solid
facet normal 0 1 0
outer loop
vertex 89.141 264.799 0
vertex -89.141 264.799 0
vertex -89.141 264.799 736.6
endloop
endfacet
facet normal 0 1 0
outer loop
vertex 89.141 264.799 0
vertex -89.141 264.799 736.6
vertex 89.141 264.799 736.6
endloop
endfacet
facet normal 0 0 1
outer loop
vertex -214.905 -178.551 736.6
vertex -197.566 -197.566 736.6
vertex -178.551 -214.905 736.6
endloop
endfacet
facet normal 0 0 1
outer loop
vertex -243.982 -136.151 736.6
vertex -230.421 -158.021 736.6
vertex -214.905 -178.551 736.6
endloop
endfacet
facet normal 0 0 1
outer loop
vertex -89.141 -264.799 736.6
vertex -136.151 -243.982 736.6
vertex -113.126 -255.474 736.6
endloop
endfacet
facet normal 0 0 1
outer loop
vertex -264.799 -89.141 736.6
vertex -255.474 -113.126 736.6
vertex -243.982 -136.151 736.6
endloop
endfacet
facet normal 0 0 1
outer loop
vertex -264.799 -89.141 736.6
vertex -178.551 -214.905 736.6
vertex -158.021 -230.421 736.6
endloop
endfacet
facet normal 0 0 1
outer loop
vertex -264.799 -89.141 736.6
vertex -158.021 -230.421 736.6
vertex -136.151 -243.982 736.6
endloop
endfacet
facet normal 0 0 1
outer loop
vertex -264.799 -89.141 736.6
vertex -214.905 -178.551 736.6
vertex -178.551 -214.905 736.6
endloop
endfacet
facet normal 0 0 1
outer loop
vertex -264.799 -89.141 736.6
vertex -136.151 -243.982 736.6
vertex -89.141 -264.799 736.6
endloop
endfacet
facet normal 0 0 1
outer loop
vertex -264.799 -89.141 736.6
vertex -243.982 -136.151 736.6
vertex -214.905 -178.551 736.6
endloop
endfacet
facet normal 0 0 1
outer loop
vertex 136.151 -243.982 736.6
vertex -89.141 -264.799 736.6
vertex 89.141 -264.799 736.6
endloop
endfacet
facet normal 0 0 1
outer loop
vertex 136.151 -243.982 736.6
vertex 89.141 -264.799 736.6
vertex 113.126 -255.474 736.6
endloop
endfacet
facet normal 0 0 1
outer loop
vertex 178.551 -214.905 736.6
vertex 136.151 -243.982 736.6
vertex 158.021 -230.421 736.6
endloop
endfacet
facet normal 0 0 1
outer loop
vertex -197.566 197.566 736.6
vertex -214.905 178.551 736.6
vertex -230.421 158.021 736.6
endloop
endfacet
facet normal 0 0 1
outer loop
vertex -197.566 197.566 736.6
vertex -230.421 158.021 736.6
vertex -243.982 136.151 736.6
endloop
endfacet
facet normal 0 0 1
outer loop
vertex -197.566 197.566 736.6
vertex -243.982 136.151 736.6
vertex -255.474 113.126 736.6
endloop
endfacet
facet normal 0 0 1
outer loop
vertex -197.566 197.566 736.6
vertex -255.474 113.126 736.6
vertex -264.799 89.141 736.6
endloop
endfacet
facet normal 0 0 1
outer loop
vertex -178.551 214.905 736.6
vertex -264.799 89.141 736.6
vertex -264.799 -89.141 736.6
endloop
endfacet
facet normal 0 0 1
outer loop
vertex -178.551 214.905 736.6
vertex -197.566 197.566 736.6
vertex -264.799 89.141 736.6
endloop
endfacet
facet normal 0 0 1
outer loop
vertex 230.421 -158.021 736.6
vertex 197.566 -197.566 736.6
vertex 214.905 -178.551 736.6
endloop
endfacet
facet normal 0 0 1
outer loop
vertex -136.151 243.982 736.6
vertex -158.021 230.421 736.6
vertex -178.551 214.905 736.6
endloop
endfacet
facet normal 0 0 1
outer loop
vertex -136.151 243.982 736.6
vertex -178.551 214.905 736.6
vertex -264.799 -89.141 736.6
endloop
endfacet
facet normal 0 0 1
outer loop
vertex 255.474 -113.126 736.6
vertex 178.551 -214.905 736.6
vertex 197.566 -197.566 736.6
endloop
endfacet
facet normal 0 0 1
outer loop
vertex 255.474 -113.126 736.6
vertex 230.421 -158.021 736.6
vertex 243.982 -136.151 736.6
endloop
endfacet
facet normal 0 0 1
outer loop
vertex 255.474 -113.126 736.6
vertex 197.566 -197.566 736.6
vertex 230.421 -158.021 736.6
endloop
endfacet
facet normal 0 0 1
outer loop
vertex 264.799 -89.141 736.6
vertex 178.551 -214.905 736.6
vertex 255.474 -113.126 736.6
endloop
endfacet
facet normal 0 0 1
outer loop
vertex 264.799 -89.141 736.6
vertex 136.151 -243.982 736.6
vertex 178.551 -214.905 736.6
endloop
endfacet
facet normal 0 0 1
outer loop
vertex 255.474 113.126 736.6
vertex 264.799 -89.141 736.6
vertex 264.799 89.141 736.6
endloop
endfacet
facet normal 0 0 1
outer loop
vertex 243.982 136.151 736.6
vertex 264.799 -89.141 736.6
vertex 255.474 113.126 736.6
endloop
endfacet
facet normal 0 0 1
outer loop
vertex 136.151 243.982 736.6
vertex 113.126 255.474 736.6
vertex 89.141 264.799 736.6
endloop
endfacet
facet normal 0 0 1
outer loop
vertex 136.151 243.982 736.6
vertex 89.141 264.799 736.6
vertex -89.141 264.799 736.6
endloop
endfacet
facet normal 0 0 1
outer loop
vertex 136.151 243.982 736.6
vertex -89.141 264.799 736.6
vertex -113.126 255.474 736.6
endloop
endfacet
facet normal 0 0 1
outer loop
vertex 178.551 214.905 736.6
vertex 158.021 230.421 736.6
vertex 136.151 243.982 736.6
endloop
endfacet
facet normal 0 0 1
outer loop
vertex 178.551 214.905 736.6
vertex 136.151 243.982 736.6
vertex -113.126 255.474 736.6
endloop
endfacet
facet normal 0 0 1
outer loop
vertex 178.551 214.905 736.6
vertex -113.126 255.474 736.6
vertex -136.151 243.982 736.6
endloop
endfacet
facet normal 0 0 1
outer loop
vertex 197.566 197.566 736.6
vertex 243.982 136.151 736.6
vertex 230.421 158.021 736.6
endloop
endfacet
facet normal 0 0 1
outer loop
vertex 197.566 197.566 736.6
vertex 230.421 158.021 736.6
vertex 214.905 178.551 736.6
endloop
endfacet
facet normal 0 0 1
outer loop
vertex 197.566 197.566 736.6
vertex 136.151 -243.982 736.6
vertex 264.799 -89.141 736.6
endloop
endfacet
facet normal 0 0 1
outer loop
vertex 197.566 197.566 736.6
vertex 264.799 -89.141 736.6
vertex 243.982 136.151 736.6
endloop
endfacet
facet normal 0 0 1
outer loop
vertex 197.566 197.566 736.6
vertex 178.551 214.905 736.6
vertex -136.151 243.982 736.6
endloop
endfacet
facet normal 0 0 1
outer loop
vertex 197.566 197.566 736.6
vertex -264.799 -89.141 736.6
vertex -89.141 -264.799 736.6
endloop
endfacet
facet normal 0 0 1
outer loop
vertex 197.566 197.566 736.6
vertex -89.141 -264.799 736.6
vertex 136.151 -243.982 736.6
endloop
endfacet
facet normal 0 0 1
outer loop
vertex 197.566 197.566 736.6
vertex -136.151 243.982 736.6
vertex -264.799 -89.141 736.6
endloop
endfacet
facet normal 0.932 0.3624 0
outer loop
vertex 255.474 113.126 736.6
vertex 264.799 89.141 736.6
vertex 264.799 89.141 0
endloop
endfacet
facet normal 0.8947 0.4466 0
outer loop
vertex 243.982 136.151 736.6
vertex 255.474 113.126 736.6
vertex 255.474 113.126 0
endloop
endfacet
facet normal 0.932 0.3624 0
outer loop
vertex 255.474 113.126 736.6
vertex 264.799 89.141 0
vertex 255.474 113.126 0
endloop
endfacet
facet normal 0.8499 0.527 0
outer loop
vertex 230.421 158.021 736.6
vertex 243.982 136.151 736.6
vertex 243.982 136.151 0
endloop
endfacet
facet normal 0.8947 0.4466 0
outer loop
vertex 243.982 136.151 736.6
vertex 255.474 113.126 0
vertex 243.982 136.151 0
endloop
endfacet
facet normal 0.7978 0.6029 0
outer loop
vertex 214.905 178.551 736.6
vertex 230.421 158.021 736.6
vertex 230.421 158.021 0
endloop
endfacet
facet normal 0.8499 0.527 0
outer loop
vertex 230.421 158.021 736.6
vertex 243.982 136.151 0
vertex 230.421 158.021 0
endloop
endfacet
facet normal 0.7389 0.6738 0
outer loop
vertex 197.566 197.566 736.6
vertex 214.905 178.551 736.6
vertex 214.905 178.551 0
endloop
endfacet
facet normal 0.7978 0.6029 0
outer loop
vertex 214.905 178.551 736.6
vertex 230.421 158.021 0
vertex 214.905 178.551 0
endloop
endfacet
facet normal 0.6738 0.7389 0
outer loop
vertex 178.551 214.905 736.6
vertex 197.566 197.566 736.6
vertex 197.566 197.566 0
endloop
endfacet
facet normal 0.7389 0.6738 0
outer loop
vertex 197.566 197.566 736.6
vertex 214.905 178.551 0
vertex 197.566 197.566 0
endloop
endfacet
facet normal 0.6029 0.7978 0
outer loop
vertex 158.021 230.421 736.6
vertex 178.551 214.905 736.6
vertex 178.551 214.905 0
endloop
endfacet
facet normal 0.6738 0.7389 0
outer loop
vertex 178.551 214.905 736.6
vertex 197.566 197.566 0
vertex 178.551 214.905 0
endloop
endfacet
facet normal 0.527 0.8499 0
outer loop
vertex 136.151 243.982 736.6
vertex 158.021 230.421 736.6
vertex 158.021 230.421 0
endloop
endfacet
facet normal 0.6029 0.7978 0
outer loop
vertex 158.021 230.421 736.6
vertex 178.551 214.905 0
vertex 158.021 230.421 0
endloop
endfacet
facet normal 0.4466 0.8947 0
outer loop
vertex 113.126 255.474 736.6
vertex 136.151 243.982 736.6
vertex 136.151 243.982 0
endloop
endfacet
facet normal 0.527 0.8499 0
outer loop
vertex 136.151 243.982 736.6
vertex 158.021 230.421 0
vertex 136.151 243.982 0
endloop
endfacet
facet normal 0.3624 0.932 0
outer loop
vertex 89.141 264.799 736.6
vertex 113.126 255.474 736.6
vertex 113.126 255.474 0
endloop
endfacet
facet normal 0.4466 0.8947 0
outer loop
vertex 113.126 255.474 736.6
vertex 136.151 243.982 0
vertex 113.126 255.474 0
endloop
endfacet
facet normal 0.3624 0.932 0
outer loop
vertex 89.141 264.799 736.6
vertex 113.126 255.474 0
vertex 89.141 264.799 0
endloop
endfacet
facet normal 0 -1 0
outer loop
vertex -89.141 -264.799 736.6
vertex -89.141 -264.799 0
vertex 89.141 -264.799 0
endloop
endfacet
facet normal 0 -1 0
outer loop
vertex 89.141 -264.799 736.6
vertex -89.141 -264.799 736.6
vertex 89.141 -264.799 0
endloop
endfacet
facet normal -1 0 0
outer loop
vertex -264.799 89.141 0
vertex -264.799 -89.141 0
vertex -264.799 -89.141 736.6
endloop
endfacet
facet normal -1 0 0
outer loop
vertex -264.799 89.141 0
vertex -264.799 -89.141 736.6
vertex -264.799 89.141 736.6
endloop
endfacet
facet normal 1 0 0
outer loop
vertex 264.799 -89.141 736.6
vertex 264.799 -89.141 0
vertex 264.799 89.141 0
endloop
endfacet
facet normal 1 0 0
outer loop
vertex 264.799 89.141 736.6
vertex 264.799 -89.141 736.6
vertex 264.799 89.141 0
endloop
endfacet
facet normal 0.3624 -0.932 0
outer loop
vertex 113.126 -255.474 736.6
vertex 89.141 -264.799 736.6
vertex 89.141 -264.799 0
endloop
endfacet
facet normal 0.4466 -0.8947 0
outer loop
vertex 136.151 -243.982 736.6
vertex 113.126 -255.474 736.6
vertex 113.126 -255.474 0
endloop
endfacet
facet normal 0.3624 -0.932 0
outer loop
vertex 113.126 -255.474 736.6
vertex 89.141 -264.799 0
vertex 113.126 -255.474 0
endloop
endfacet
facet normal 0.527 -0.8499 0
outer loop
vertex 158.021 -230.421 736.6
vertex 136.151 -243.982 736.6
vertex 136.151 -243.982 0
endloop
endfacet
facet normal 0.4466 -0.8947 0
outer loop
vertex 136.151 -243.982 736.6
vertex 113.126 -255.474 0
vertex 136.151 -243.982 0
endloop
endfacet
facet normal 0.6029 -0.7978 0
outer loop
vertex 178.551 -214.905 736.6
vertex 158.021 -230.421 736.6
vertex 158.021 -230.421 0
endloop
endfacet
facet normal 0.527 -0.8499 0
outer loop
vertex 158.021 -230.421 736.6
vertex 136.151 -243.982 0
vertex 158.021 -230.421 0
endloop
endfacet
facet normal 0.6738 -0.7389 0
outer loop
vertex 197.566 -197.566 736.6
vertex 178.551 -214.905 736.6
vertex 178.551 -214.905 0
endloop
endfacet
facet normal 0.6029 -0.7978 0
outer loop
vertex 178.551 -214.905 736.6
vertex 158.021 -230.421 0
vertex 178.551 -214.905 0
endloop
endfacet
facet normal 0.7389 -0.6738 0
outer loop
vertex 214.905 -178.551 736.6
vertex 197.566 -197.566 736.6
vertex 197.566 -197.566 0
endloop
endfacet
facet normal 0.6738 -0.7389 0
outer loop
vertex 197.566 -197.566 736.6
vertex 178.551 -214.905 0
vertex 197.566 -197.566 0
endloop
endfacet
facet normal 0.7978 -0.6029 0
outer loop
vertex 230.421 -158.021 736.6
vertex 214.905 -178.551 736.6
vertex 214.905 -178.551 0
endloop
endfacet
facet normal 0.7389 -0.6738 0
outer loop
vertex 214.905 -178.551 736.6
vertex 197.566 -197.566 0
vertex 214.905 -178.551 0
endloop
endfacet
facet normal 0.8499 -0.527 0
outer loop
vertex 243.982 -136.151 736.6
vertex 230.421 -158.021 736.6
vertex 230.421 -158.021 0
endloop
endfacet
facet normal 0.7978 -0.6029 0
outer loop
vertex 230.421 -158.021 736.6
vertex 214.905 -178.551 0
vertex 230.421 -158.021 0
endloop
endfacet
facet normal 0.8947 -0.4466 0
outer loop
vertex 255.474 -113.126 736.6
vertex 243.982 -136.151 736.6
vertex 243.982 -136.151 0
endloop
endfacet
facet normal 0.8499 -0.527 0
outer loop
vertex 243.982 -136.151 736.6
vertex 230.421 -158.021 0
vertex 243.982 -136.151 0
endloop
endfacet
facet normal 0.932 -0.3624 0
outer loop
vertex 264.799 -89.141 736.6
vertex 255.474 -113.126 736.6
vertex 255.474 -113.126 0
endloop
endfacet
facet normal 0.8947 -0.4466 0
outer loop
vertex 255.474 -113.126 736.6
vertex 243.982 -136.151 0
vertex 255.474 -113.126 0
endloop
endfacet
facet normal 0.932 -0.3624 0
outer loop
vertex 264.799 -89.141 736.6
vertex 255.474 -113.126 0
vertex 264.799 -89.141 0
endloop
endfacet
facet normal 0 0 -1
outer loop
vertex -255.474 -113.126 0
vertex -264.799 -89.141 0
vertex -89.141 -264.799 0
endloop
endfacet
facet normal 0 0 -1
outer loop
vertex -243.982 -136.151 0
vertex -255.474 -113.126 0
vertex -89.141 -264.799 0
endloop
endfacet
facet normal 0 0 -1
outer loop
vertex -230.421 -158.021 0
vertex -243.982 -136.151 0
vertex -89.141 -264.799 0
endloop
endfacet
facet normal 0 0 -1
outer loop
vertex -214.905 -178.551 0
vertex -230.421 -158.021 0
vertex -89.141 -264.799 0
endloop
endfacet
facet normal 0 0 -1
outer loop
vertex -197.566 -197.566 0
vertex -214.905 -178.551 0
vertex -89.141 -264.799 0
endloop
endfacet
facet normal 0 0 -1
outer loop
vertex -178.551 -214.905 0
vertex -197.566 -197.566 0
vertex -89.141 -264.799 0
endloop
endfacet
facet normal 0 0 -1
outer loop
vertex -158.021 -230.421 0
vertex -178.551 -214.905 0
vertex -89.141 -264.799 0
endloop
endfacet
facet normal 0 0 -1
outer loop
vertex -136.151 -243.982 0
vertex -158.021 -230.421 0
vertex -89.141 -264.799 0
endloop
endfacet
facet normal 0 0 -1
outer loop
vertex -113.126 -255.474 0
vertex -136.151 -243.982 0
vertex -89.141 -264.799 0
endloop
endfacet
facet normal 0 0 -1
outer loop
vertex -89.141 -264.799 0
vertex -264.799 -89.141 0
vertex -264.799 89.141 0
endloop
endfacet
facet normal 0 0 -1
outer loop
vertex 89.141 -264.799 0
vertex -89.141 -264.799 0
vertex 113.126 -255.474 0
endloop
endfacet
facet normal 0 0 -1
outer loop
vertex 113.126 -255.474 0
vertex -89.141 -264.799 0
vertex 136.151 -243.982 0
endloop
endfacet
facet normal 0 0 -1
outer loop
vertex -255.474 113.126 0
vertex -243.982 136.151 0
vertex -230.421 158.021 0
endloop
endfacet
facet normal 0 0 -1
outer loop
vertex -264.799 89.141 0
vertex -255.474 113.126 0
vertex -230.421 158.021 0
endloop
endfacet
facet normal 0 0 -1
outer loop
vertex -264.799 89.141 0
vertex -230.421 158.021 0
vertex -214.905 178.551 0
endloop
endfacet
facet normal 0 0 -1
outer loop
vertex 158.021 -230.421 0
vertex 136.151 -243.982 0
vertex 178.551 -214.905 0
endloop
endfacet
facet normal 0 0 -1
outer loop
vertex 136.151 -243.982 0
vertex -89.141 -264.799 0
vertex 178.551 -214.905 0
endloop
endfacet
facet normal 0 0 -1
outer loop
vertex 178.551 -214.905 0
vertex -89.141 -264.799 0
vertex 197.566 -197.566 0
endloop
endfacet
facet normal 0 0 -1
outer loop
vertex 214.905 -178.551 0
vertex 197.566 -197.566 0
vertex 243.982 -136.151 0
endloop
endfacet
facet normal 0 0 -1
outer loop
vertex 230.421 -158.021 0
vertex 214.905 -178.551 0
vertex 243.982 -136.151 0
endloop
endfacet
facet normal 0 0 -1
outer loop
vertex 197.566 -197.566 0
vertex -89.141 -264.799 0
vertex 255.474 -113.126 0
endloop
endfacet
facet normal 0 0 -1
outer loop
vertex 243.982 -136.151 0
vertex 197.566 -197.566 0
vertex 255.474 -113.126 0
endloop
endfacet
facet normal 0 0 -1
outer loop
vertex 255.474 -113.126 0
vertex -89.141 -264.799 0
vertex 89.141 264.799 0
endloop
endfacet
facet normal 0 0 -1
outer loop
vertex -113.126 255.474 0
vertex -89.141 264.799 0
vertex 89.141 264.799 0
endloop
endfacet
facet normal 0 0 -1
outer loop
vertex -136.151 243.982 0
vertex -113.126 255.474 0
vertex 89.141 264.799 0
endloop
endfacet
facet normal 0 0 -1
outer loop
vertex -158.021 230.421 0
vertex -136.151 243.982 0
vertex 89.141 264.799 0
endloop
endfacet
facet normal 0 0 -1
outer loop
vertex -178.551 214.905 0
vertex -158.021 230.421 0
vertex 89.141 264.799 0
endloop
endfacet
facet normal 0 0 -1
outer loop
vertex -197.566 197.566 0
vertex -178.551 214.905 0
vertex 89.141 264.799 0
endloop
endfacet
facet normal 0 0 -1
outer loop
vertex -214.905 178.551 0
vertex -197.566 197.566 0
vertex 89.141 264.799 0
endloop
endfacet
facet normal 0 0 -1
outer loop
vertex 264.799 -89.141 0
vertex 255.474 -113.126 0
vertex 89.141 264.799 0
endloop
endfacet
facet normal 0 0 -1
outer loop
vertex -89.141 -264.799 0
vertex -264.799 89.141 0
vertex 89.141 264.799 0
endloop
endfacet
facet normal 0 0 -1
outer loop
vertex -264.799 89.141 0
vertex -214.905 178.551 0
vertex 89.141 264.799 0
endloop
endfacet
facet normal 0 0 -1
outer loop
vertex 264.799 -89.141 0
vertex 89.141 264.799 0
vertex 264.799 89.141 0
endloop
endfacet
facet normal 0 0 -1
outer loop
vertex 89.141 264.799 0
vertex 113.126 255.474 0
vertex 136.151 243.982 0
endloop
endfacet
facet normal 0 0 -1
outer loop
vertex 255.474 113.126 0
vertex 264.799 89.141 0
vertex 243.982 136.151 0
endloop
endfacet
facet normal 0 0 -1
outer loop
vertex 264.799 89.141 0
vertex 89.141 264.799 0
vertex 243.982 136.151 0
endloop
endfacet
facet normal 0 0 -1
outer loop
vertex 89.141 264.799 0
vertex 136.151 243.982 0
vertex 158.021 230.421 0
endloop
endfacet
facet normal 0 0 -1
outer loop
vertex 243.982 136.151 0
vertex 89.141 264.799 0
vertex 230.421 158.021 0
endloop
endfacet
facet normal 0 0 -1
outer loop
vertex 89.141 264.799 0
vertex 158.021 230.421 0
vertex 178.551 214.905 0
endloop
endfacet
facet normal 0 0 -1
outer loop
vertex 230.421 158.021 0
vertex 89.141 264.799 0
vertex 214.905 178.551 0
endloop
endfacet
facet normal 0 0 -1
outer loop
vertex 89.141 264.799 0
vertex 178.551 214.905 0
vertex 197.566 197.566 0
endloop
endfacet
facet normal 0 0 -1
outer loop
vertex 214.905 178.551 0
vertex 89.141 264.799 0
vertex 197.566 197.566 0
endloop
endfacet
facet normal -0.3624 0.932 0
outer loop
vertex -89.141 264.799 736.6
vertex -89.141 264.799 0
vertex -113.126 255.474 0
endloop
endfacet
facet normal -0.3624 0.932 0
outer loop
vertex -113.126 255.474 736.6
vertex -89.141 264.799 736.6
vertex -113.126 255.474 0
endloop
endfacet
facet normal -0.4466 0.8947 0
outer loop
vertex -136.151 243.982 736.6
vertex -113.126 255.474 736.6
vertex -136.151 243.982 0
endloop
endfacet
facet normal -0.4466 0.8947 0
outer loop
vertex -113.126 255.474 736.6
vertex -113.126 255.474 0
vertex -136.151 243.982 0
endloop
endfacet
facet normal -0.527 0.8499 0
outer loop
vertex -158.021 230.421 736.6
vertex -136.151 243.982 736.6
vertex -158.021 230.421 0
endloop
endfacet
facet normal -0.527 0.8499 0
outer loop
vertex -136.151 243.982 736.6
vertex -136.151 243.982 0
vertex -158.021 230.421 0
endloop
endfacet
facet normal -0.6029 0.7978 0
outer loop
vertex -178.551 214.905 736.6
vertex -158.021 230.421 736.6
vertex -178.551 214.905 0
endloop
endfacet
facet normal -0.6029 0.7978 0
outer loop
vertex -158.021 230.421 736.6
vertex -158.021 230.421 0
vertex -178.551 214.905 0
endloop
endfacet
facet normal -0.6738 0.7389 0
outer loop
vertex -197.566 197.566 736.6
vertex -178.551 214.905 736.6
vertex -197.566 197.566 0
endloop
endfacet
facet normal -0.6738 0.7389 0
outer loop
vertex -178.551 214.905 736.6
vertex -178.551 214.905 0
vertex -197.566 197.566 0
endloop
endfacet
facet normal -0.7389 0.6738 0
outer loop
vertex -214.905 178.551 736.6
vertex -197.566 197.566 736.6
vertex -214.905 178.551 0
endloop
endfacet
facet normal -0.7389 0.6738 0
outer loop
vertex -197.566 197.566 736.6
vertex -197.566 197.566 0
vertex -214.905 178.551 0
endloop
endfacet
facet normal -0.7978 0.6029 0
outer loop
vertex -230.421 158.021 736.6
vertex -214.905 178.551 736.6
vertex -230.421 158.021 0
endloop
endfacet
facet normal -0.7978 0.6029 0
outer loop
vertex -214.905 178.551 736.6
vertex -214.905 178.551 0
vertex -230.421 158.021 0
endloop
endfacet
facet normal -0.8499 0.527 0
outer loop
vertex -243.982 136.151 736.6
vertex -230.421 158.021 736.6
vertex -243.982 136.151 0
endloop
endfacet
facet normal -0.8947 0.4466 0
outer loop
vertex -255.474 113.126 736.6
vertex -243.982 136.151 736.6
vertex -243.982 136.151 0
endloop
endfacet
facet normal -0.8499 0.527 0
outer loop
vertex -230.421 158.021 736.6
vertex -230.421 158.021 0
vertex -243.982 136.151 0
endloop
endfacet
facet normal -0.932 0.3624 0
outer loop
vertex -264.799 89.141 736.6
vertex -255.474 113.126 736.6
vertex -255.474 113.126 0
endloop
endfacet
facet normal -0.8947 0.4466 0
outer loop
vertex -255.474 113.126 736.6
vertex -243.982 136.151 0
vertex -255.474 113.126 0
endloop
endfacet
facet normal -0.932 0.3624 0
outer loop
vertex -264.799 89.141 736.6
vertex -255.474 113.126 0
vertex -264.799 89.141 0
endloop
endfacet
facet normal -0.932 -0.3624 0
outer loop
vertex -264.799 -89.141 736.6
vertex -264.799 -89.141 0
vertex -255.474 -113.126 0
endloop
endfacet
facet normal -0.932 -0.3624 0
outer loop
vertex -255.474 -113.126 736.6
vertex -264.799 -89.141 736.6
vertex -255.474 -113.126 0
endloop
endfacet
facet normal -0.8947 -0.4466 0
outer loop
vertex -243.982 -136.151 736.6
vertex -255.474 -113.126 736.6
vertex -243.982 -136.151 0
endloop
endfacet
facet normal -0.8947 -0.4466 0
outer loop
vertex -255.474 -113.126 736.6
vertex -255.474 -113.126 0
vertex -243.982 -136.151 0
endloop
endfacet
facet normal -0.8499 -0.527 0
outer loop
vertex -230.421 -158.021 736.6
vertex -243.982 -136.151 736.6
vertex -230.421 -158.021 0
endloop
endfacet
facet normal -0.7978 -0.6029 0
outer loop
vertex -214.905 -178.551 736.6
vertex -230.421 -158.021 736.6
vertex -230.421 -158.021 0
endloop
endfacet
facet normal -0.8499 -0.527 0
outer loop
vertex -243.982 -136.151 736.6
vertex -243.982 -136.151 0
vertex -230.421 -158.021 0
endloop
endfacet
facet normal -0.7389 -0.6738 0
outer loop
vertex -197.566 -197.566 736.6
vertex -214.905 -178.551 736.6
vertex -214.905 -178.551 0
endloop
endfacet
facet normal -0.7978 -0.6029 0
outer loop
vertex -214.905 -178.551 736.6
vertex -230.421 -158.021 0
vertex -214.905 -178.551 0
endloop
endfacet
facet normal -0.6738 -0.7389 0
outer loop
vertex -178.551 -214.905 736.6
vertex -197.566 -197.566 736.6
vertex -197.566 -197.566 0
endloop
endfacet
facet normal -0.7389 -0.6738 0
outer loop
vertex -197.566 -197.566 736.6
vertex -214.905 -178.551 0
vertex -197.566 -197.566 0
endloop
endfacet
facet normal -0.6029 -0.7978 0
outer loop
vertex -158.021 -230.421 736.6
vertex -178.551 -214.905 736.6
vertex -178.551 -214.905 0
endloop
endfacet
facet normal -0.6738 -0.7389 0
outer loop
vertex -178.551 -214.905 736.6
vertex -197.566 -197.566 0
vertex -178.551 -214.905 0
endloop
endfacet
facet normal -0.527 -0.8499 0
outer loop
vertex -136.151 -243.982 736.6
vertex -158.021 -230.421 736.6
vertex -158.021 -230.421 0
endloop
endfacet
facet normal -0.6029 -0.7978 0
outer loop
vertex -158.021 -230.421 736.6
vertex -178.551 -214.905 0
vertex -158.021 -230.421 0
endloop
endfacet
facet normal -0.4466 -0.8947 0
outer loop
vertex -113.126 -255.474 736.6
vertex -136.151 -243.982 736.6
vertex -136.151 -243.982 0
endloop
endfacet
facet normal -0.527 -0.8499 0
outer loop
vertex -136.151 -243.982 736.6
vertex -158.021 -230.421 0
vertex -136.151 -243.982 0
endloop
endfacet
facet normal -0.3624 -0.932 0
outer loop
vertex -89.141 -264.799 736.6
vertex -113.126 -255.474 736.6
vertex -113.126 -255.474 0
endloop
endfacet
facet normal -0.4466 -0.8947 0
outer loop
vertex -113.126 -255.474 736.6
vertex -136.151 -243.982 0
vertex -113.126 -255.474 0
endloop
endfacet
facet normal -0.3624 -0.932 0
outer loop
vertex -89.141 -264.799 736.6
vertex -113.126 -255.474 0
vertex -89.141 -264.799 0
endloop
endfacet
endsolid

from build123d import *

# Parameters (mm, degrees)
F0_R     = 279.4
F1_DEPTH = 736.6
F2_W     = 195.749157
F2_H     = 25.4
F2_W_2   = 25.4
F2_H_2   = 195.749157
F3_DEPTH = 1010.92


with BuildPart() as f1:
    # F0 (on Top) → F1 (new body)
    with BuildSketch(Plane.XY):
        Circle(F0_R)
    extrude(amount=F1_DEPTH)

    # F2 (on Top) → F3 (cut)
    with BuildSketch(Plane.XY):
        with Locations((0.382937, 277.498556)):
            Rectangle(F2_W, F2_H)
        with Locations((-277.498556, 0.382937)):
            Rectangle(F2_W_2, F2_H_2)
        with Locations((-0.382937, -277.498556)):
            Rectangle(F2_W, F2_H)
        with Locations((277.498556, -0.382937)):
            Rectangle(F2_W_2, F2_H_2)
    extrude(amount=F3_DEPTH, mode=Mode.SUBTRACT)


solid = f1.part
